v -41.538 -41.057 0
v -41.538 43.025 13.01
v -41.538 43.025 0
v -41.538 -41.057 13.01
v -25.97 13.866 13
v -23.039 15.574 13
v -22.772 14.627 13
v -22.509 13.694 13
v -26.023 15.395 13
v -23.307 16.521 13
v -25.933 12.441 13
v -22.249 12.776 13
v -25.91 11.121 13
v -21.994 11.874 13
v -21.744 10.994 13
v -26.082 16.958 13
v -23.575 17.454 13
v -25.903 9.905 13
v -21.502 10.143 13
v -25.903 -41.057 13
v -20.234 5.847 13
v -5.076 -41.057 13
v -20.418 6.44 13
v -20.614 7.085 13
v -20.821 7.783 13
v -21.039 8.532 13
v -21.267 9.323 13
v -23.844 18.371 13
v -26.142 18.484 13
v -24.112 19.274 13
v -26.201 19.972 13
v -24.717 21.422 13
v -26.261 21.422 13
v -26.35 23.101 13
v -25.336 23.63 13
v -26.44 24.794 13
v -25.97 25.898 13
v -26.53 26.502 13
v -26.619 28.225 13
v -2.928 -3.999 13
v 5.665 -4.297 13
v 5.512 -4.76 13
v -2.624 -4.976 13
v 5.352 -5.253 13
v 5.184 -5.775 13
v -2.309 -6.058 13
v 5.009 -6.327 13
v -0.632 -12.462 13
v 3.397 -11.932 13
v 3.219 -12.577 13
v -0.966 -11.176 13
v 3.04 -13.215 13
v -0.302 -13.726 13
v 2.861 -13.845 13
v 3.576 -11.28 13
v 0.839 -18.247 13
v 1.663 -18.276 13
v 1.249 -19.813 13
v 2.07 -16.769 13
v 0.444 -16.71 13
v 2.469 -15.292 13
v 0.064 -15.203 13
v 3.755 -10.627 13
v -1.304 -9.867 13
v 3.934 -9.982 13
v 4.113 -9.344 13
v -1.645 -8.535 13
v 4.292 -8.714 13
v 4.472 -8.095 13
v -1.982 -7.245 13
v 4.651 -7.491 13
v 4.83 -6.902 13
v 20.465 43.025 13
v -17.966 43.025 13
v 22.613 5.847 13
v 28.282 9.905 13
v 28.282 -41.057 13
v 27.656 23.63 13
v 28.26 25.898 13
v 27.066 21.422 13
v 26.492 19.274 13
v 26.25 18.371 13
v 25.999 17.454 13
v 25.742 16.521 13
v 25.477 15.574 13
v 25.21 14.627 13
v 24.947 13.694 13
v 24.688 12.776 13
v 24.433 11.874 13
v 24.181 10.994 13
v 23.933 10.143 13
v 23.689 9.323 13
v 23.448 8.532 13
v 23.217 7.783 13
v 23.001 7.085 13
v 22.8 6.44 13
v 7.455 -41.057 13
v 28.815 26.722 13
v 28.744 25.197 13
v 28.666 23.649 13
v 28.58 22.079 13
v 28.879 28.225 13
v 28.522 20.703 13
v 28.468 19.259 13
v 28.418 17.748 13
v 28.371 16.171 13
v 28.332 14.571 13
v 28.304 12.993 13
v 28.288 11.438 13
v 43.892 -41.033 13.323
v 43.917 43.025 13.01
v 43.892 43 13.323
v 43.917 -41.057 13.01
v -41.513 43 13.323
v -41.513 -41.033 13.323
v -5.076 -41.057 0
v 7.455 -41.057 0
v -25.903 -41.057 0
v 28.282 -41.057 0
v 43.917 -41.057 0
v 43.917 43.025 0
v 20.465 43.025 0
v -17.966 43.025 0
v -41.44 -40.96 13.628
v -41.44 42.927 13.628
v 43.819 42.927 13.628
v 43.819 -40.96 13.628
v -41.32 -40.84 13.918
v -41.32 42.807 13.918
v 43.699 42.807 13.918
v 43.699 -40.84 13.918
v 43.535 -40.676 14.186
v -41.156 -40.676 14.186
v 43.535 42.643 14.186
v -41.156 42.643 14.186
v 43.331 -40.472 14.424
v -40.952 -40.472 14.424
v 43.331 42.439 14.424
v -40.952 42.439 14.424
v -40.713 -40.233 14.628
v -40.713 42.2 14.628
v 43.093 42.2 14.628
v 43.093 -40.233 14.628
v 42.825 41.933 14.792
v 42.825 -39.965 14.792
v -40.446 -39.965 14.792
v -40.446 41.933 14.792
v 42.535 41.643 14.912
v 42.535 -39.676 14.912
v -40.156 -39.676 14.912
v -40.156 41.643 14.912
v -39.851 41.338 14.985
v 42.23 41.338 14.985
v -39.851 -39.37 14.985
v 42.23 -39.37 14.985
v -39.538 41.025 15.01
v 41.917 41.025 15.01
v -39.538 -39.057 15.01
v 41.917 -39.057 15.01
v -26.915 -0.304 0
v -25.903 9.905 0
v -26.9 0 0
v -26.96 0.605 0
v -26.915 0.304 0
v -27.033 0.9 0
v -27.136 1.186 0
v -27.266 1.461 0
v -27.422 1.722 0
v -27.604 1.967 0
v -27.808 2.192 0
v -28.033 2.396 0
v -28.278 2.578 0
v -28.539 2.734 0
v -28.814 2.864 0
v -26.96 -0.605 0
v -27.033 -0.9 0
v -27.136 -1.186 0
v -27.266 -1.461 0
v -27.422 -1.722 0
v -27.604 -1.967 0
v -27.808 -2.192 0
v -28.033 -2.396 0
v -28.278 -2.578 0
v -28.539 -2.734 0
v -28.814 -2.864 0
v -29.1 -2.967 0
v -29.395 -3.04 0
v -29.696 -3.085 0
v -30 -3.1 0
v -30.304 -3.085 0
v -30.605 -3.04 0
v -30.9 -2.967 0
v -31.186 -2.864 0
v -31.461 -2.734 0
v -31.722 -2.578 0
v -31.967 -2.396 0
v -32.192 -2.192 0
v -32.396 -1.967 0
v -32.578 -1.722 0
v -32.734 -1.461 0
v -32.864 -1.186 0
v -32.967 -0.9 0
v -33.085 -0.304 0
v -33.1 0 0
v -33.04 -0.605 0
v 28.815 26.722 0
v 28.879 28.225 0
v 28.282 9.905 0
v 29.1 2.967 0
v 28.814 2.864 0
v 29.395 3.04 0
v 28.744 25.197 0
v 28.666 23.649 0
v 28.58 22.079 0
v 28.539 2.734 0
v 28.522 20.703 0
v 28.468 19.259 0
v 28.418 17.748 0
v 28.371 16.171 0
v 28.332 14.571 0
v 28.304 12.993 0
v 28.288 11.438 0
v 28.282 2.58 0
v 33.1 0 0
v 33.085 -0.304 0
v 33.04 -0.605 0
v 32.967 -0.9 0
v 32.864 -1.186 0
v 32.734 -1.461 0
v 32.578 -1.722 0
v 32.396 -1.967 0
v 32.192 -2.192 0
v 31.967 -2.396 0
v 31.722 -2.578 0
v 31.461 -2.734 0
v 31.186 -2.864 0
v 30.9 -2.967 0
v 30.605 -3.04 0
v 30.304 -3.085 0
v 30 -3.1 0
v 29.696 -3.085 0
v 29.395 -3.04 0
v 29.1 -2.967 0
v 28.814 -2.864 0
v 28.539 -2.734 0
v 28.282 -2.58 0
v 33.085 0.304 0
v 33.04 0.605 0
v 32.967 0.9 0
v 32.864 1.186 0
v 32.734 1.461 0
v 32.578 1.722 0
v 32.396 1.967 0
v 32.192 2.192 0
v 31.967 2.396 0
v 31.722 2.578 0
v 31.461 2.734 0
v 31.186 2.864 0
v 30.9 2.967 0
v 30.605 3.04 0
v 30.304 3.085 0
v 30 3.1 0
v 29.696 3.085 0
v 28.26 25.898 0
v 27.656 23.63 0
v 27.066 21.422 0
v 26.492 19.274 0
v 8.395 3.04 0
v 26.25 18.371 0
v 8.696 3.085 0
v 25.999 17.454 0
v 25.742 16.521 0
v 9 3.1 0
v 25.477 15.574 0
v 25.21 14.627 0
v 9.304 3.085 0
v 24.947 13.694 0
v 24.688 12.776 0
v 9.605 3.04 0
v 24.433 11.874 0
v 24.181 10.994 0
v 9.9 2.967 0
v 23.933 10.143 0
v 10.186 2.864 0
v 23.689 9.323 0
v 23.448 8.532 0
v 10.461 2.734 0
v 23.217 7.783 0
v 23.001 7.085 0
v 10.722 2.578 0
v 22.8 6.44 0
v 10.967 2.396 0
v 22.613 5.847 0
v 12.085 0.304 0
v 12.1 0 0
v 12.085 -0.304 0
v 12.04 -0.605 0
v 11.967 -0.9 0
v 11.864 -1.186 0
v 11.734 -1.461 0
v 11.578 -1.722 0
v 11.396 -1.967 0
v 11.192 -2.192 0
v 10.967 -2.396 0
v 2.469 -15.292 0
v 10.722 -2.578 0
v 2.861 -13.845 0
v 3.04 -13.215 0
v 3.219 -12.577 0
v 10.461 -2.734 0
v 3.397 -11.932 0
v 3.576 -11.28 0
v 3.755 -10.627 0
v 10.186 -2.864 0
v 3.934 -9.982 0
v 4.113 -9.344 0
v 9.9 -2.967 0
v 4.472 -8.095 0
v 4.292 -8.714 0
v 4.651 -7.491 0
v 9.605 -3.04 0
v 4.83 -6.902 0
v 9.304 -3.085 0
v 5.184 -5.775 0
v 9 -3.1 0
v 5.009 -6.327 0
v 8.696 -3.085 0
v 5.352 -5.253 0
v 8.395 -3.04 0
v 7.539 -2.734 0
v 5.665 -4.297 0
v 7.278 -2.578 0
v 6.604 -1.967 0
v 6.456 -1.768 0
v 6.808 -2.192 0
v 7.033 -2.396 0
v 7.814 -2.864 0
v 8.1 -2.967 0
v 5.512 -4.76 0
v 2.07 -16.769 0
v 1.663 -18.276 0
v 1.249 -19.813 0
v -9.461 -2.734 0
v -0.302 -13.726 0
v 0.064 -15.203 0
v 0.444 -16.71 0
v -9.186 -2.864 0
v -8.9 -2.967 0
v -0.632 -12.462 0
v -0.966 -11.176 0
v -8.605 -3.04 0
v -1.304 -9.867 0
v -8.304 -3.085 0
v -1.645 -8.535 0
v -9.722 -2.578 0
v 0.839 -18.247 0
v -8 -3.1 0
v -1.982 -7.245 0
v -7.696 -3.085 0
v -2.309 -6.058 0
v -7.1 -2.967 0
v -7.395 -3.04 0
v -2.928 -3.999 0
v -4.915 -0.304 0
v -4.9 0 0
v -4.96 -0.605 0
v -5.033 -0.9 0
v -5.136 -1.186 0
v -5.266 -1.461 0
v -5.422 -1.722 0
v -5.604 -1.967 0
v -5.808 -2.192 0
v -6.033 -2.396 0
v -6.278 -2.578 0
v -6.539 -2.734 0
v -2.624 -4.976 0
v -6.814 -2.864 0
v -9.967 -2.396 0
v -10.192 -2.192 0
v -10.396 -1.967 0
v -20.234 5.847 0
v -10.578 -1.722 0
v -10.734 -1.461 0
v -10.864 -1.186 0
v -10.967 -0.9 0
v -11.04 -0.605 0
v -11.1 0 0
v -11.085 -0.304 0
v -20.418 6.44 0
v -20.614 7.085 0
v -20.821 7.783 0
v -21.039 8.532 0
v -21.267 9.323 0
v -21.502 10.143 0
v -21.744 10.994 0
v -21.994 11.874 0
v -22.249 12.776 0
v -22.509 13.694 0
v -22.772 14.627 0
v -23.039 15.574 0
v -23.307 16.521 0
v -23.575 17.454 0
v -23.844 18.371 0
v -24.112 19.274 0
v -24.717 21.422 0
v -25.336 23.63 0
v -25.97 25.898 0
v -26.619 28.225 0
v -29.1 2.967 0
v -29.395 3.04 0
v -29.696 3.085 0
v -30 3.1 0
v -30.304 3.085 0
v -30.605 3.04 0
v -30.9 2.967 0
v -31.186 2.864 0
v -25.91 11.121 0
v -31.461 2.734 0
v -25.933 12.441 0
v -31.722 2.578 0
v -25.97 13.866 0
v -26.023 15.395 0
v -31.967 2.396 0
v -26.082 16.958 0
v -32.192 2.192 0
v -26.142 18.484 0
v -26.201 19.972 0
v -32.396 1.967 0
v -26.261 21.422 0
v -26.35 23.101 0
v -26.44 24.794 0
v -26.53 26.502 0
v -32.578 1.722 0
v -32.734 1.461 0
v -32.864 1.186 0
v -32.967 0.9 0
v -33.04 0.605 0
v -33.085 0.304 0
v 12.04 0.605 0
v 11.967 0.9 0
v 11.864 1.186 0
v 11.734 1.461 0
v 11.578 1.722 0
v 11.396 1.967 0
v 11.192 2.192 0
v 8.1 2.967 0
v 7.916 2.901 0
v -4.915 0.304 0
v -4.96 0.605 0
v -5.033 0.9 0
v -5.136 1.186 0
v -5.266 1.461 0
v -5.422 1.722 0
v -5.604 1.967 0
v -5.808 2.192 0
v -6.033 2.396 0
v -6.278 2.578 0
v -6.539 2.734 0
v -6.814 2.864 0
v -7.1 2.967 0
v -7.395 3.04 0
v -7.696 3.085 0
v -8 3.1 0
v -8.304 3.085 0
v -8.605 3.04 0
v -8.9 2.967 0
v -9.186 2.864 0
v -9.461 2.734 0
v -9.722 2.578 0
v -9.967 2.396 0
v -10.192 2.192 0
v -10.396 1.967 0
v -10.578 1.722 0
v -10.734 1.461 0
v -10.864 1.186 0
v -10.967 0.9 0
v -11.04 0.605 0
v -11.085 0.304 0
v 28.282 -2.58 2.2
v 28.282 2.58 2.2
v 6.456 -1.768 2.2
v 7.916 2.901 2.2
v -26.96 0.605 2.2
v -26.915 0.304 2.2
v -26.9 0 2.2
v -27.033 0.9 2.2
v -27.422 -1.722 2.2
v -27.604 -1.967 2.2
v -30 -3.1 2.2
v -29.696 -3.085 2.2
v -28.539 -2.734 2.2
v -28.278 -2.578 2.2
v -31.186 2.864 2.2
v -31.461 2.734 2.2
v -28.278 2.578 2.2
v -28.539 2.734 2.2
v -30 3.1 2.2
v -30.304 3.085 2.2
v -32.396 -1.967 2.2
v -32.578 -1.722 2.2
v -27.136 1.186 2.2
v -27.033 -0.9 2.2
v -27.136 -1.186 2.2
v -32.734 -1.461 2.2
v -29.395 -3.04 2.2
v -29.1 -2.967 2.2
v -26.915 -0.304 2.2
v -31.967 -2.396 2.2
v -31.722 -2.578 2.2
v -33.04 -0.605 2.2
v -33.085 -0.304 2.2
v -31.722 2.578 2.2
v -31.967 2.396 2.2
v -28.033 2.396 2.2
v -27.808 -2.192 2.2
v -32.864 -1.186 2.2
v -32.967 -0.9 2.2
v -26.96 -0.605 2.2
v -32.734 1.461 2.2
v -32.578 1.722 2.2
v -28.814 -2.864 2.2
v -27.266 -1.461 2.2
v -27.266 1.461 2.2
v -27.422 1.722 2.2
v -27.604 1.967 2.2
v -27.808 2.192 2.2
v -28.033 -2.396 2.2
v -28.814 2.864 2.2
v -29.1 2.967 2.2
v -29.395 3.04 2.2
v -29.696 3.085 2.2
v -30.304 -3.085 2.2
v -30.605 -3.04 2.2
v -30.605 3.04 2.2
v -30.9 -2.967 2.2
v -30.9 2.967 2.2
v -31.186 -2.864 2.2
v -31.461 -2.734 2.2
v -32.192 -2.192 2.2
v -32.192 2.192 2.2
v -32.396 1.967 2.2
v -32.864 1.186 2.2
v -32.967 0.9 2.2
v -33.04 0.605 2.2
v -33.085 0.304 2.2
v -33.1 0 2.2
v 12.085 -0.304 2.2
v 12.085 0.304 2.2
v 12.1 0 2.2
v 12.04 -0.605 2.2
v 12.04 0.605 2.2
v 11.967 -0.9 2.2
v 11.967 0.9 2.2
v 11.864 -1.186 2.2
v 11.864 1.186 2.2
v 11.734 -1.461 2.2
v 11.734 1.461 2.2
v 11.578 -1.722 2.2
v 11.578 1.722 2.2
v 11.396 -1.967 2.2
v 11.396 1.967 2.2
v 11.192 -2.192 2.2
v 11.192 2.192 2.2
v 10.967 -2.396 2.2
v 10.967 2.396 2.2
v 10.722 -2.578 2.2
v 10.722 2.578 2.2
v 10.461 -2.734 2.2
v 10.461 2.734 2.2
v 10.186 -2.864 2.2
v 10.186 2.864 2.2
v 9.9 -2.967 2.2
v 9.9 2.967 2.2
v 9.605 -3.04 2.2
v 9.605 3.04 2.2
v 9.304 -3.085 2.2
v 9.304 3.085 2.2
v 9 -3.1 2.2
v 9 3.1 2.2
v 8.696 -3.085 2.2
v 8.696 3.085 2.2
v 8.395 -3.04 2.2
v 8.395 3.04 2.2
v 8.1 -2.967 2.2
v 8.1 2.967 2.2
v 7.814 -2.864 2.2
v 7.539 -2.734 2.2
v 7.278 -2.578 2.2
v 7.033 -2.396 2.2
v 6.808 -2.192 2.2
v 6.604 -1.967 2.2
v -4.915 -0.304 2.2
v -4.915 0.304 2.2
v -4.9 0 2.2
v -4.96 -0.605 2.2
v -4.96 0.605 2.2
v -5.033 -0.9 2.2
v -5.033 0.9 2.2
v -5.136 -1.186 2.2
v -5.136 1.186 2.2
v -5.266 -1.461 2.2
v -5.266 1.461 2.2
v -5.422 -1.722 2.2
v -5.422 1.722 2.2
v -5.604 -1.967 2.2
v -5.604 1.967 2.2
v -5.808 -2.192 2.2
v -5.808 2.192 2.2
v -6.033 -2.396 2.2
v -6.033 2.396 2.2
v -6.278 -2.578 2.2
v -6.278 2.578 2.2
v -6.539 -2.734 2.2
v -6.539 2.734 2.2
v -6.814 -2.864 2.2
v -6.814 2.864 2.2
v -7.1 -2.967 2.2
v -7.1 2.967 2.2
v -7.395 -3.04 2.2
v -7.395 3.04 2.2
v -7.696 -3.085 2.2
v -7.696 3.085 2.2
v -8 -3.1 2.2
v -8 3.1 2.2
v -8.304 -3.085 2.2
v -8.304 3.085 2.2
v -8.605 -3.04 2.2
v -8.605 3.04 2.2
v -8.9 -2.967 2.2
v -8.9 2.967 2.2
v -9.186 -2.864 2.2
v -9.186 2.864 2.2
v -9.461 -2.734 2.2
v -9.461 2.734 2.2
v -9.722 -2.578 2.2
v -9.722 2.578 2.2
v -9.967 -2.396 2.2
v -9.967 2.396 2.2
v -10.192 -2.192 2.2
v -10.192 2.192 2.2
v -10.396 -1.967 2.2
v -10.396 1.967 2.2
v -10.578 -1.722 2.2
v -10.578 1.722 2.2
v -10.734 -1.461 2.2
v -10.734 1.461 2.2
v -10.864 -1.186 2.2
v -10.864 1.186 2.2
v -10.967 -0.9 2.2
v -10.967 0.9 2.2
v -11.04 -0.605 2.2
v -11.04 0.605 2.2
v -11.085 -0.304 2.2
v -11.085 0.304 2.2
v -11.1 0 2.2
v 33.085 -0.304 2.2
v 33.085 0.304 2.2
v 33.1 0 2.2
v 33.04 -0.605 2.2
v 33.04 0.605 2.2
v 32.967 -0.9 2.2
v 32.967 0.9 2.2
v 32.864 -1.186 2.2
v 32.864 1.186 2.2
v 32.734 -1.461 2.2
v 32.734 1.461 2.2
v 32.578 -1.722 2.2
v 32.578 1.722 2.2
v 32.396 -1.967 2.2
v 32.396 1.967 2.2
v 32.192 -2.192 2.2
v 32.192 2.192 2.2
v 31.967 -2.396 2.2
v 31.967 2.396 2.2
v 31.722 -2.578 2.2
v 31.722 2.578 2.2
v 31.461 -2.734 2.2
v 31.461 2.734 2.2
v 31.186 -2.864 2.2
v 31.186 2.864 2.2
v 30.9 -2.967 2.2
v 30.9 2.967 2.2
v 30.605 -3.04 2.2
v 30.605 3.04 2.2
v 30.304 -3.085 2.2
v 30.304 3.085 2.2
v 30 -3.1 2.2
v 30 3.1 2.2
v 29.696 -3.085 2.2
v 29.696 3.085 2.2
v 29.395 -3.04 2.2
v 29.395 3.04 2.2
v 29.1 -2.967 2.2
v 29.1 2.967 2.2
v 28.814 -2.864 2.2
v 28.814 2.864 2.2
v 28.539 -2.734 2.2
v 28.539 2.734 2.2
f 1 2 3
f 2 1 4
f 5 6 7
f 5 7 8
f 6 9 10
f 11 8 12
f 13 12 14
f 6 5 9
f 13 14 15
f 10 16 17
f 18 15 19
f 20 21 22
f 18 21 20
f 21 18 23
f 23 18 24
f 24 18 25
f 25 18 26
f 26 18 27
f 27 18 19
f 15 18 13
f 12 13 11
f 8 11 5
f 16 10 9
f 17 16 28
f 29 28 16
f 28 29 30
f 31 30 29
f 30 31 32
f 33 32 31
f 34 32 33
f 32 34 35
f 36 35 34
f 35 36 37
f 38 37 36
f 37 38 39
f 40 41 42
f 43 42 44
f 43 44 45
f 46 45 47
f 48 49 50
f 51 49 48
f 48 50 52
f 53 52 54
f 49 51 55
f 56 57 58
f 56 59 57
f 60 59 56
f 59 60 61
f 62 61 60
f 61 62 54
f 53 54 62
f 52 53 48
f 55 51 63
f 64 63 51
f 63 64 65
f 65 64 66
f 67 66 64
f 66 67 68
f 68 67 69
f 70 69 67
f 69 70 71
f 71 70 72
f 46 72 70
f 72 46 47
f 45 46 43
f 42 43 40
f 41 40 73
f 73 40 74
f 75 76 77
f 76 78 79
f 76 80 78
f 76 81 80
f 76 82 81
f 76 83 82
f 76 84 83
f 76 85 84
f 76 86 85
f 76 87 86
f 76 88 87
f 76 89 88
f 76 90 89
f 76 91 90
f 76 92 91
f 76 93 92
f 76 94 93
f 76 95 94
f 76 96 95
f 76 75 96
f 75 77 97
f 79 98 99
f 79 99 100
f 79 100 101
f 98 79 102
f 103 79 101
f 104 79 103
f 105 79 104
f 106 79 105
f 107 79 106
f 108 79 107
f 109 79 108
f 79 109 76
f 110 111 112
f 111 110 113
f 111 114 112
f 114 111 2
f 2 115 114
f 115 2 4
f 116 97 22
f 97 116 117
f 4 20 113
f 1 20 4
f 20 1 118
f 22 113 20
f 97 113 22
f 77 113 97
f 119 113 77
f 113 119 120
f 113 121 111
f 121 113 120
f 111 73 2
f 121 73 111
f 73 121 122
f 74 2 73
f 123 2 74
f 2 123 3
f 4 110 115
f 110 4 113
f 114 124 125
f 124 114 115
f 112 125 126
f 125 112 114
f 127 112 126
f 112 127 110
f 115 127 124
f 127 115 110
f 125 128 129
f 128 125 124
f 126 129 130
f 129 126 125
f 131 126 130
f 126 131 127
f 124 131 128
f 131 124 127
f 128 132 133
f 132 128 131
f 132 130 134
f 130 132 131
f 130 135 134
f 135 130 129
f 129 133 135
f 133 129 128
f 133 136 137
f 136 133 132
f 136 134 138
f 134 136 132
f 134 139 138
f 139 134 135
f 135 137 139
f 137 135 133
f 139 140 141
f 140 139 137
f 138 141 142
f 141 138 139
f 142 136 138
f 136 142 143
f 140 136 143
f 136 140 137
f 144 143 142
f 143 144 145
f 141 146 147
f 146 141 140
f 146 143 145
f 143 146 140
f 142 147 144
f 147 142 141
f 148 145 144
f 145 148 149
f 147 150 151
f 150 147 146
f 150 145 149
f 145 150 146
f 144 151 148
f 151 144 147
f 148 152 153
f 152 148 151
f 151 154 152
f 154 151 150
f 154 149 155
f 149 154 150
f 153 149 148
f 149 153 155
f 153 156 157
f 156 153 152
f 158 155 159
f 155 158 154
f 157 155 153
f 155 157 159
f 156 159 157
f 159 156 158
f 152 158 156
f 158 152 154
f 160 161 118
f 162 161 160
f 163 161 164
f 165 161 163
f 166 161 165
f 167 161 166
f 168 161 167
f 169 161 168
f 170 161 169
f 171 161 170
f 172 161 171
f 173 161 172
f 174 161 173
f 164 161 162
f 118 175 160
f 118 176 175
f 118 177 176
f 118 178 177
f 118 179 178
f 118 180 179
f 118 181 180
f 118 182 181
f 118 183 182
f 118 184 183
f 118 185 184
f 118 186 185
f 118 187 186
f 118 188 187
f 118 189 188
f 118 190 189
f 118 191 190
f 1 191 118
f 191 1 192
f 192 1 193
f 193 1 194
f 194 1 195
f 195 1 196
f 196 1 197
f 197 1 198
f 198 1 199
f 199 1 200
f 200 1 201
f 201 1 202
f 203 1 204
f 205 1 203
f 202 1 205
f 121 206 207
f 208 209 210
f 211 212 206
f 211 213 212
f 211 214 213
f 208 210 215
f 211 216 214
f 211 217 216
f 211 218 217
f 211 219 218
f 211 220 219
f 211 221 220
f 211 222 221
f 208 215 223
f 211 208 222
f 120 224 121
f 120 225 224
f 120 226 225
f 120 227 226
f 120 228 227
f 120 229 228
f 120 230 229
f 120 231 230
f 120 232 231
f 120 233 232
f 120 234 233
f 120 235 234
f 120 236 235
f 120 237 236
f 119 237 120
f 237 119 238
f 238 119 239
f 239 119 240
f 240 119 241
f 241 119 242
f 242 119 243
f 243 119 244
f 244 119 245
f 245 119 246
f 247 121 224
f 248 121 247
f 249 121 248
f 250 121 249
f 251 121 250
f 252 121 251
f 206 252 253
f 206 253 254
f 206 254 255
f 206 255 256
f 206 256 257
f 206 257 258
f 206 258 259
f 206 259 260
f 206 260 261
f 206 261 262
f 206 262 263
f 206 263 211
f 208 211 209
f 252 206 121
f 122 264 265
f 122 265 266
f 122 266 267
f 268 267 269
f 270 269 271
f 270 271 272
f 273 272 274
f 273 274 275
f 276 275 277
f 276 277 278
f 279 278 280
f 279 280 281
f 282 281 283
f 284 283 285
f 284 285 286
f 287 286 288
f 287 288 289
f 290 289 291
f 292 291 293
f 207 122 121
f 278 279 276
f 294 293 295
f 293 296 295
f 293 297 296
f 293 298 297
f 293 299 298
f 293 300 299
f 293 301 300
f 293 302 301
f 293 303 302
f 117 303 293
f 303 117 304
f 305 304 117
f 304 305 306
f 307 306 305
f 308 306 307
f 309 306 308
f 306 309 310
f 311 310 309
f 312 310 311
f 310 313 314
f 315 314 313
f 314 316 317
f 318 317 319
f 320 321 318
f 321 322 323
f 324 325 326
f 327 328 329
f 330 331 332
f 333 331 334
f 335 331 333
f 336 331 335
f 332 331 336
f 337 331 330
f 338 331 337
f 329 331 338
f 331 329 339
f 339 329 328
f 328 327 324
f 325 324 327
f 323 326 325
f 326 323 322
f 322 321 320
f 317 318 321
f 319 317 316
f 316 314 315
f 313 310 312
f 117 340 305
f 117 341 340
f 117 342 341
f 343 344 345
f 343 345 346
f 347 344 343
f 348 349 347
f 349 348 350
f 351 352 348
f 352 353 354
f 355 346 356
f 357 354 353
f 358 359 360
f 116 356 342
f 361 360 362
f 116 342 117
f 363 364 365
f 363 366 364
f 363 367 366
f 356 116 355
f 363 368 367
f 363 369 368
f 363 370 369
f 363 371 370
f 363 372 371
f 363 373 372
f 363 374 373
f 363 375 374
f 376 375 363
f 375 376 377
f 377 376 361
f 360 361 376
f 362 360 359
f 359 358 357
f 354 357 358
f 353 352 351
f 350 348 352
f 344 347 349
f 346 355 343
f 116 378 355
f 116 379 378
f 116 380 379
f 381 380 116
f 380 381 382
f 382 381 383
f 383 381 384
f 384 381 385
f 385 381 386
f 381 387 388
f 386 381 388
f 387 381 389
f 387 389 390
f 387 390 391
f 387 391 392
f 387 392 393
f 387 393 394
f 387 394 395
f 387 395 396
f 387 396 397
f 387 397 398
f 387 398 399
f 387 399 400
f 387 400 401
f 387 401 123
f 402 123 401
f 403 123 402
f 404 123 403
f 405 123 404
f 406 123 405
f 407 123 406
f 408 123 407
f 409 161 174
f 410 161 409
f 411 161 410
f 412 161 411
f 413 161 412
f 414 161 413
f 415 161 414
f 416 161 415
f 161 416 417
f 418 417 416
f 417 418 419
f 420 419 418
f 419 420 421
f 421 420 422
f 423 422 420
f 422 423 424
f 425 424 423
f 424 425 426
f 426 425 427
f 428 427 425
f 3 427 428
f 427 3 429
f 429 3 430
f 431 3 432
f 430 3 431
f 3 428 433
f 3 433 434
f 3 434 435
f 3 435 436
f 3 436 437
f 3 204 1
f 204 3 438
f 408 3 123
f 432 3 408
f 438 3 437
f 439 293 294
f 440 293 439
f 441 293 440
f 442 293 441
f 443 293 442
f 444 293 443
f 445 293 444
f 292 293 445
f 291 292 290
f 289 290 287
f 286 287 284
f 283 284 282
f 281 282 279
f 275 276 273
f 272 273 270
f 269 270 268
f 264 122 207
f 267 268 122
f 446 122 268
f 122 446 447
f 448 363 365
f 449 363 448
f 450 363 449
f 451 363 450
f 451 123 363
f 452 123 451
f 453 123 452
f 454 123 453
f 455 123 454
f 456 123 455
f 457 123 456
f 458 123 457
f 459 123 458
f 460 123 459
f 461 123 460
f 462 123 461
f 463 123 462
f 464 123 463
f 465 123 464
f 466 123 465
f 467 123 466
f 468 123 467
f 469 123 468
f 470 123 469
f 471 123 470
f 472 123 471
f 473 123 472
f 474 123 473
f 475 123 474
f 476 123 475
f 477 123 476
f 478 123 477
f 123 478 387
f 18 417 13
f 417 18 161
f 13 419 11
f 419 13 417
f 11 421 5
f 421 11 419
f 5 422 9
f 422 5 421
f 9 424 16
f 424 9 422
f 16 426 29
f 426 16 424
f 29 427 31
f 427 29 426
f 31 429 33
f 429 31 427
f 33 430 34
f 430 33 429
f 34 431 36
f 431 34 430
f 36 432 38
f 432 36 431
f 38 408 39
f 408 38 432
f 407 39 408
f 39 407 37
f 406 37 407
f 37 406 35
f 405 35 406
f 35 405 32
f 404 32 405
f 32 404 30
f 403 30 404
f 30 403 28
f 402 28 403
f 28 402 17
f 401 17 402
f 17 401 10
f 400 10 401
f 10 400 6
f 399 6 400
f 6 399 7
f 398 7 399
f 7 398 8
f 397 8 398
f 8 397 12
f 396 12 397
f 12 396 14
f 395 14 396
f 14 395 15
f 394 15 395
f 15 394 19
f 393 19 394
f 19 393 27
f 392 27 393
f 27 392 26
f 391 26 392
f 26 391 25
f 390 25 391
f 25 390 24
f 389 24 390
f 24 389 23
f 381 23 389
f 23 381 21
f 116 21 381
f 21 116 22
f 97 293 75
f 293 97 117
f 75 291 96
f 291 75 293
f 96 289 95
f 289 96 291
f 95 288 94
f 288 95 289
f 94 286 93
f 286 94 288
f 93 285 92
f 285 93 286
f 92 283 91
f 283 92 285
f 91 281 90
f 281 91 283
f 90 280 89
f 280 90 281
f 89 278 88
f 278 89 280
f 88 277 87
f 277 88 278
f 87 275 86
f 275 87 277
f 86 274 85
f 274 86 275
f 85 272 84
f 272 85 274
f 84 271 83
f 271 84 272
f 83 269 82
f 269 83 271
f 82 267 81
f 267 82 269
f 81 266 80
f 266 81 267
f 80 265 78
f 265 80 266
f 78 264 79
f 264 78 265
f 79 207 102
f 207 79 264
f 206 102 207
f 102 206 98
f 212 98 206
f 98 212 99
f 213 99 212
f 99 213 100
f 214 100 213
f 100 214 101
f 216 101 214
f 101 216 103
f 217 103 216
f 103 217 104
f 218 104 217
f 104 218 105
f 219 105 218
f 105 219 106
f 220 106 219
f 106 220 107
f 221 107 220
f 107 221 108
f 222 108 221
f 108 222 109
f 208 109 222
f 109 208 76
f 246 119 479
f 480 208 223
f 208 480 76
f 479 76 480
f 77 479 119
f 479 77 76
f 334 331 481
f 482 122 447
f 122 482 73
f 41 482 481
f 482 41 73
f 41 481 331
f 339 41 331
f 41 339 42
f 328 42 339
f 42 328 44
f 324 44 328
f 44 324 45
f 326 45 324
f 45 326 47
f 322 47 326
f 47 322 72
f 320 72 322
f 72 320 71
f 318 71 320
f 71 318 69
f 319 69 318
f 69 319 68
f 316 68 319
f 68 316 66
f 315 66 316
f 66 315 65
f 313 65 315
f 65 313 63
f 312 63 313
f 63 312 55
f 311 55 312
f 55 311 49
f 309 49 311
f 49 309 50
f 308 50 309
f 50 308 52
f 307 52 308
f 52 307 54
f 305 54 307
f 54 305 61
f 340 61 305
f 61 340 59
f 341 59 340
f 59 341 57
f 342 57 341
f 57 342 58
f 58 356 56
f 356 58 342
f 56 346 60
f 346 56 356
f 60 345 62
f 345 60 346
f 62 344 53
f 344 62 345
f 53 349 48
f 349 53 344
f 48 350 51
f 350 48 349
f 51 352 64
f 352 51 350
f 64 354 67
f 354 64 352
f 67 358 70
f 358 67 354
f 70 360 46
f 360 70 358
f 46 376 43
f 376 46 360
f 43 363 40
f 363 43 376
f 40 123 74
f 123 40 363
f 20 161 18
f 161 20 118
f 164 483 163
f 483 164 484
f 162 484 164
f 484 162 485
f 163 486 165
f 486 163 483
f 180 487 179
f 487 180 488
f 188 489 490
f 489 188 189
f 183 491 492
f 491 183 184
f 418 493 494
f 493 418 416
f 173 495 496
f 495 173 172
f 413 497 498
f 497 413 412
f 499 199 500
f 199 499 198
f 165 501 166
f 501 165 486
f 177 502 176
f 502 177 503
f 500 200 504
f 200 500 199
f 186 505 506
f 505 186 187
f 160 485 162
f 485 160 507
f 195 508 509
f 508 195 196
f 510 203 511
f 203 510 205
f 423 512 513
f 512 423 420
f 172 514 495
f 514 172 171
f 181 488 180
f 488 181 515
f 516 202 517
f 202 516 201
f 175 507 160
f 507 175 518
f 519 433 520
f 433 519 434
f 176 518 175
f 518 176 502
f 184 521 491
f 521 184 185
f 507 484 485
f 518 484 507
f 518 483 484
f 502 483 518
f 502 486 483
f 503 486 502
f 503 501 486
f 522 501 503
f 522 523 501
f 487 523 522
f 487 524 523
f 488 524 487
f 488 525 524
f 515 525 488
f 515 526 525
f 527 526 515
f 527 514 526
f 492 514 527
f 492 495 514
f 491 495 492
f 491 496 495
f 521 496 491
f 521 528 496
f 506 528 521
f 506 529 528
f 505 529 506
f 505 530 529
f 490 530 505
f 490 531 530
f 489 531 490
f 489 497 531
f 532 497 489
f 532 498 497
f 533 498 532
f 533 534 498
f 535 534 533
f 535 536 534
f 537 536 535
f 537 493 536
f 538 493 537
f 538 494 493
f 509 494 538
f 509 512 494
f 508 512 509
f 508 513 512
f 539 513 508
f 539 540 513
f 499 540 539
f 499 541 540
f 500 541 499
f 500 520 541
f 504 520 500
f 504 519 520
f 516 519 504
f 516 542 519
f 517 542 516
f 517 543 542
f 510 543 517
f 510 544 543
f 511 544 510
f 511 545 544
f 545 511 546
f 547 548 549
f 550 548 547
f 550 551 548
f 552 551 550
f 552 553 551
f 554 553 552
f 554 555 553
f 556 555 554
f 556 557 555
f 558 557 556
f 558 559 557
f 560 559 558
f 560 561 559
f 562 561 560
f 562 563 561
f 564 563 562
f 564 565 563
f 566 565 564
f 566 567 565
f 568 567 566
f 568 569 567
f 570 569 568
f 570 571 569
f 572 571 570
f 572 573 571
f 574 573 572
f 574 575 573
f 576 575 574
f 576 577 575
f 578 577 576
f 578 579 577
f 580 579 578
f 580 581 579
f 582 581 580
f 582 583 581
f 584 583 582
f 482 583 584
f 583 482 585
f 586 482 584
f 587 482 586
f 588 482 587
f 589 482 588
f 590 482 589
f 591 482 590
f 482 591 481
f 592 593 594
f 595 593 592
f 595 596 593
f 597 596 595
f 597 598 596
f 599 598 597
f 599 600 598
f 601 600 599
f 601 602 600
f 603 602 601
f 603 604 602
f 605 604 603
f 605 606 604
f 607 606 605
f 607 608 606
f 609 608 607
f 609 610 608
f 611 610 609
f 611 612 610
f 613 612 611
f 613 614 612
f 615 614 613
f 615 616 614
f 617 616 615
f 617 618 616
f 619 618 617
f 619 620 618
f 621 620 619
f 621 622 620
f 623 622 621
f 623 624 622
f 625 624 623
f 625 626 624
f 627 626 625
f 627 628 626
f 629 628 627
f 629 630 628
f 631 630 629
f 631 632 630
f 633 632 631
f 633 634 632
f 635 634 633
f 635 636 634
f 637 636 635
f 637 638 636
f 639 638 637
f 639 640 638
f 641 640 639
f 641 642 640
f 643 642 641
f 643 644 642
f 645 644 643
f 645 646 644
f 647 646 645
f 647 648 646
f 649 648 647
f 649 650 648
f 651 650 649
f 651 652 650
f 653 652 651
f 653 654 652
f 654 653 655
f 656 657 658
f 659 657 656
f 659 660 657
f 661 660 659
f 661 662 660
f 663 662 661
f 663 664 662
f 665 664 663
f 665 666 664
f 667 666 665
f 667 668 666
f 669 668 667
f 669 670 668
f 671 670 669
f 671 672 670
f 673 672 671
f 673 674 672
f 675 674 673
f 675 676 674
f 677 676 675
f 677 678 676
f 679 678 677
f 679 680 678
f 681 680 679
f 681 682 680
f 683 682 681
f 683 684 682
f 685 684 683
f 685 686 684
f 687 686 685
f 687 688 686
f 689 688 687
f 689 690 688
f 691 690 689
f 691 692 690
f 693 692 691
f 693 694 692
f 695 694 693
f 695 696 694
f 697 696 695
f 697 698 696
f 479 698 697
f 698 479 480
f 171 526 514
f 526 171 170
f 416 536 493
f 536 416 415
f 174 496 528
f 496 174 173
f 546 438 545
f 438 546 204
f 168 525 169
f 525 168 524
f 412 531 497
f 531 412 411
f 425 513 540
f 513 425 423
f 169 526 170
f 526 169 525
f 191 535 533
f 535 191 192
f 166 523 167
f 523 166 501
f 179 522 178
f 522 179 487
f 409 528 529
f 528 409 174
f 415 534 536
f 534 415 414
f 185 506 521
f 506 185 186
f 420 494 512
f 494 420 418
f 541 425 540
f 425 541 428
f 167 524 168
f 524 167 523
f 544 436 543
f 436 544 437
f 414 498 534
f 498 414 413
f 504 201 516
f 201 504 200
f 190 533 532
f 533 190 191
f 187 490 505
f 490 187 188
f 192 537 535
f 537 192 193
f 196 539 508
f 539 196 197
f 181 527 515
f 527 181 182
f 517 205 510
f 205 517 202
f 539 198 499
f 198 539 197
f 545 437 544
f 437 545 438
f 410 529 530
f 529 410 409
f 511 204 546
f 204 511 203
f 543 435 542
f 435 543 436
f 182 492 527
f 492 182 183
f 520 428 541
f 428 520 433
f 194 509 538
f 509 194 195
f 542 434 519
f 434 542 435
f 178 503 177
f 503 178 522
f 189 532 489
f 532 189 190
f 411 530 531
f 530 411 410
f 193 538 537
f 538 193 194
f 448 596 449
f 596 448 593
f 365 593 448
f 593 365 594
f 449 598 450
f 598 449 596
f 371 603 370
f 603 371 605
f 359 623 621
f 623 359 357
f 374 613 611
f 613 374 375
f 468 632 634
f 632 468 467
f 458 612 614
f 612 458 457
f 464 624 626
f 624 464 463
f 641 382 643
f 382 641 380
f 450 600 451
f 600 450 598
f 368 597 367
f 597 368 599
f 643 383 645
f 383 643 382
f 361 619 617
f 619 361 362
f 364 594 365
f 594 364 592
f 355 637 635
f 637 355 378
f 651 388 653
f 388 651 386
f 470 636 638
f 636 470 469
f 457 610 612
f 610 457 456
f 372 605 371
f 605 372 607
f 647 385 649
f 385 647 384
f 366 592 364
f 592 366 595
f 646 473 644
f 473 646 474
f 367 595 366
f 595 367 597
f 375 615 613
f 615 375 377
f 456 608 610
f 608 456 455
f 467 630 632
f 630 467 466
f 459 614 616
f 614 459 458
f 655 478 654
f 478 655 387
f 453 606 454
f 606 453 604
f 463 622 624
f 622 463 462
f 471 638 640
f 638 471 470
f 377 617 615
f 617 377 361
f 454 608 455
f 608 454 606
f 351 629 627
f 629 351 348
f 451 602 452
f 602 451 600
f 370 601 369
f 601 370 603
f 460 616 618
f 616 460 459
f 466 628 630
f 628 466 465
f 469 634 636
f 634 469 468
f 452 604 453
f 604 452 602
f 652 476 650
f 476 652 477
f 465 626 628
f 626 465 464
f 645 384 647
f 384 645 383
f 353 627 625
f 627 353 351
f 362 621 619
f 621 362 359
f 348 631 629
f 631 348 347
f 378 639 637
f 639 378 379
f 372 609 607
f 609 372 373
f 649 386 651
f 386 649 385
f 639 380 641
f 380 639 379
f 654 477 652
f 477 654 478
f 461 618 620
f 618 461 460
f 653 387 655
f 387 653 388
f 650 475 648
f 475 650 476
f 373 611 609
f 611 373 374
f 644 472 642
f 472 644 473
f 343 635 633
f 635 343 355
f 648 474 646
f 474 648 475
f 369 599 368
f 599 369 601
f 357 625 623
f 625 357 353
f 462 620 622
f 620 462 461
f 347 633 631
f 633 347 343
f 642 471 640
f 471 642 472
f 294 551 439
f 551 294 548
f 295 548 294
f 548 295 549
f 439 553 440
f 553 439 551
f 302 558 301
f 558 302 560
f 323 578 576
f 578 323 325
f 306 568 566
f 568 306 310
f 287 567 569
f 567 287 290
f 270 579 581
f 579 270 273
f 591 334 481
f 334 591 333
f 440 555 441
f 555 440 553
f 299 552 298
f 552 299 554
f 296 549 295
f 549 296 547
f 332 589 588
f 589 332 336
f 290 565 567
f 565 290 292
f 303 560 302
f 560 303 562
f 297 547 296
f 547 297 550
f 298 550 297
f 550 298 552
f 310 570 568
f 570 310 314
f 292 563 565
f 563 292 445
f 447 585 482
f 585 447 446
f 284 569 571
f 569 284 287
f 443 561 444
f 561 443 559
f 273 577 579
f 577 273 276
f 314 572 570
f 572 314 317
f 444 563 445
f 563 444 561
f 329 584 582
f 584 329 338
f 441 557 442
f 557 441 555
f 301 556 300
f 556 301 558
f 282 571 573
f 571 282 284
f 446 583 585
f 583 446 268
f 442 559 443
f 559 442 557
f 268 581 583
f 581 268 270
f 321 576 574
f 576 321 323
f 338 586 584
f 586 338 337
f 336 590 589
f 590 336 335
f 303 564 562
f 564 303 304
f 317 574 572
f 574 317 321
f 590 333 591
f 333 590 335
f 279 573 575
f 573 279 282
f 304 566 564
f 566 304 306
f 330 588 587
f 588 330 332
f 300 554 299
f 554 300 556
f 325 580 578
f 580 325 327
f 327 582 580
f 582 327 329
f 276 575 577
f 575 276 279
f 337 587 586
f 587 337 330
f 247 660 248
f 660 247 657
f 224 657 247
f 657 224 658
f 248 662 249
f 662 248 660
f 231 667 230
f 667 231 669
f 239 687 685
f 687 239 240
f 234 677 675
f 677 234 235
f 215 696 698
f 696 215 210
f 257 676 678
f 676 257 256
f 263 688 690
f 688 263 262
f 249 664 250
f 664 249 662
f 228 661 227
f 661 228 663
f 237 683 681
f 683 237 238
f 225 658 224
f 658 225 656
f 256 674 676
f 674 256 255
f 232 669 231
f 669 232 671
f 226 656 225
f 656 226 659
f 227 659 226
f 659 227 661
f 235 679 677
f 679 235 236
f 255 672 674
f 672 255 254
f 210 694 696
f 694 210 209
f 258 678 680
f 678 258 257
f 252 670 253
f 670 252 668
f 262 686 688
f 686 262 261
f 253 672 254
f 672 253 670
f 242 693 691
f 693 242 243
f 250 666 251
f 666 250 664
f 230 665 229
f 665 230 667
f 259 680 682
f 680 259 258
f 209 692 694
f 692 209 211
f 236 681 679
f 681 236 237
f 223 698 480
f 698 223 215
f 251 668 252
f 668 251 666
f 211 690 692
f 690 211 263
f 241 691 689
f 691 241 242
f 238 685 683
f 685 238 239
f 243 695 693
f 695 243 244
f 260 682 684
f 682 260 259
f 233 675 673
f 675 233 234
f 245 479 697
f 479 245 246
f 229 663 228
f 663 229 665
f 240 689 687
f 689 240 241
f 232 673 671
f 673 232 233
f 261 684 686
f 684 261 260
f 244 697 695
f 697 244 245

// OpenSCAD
// Fridge magnet letter tile — fits 100×100 mm build plate
// Render one letter:
//   openscad -q -D 'letter="M"' -o M.stl magnetic_letter_only.scad
// Batch-render a word:
//   for L in M O E; do openscad -q -D "letter=\"$L\"" -o "$L.stl" magnetic_letter_only.scad; done
//
// Slicer tips for faster prints:
//   - 0.28 mm layer height (or 0.3 if your nozzle allows)
//   - 10–15 % infill (gyroid or grid) — or enable hollow below
//   - 3 perimeters is plenty for strength

// ╔══════════════════════════════════════════════════════════════════╗
// ║  SETTINGS — edit these, leave everything below alone            ║
// ╚══════════════════════════════════════════════════════════════════╝

letter    = "M";
size      = 88;   // glyph height in mm (88 ≈ full 100×100 plate)
thickness = 15;   // Z height of the tile

// ── MODE — uncomment exactly one ─────────────────────────────────────────────
mode = "smart";    // hardcoded per-letter positions for A–Z (best quality)
// mode = "spiral";  // auto-spiral; only pockets that FULLY fit inside are kept
// mode = "manual";  // use magnet_positions list below

// ── Font ─────────────────────────────────────────────────────────────────────
// font_name = "Comic Sans MS:style=Bold";   // ← the MOE font (not in WASM)
// font_name = "Bahnschrift:style=Bold";
// font_name = "Bahnschrift:style=Bold Condensed";
font_name = "Liberation Sans:style=Bold";  // ← works in both WASM and desktop
// font_name = "Arial:style=Bold";
// font_name = "Impact";
// font_name = "Anton";                    // Google Font — narrow + punchy
// font_name = "Oswald:style=Bold";        // Google Font — tall + slim

// ── Fillet ───────────────────────────────────────────────────────────────────
// Rounded top edge — makes the face side feel nice.  Bottom stays flat for
// bed adhesion and magnet pockets.  Set to 0 to disable.
fillet_r     = 2;    // radius of the quarter-round (mm)
fillet_steps = 10;   // curve smoothness (more = smoother but slower render)

// ── Magnet spec ──────────────────────────────────────────────────────────────
magnet_d     = 6.2;  // pocket diameter (slightly loose for 6 mm disc magnets)
magnet_depth = 2.2;  // pocket depth

// ── MANUAL positions (used when mode = "manual") ─────────────────────────────
// Origin [0,0] = visual centre of the glyph.
magnet_positions = [
  [ 17,  15],
  [ 11, -15],
  [-15,  15],
];

// ── SPIRAL settings (used when mode = "spiral") ──────────────────────────────
spiral_max     = 4;   // target pocket count (magnets are expensive!)
spiral_spacing = 16;  // mm between candidate ring steps

// ╔══════════════════════════════════════════════════════════════════╗
// ║  PER-LETTER MAGNET POSITIONS  (mode = "smart")                  ║
// ║  Tuned for Comic Sans MS Bold at size = 88.                     ║
// ║  Coords are mm from the visual centre of each glyph.            ║
// ║  Safety-masked against the letter body so any position that      ║
// ║  misses the stroke is silently dropped.                          ║
// ╚══════════════════════════════════════════════════════════════════╝
function letter_magnets(ch) =
  ch == "A" ? [[-20, -20], [ 20, -20], [  0,  -5]             ] :
  ch == "B" ? [[-24,  18], [-24, -15], [ 14,  18], [ 14,  -8] ] :
  ch == "C" ? [[-30,   0], [  0,  26], [  0, -26]             ] :
  ch == "D" ? [[-24,  18], [-24, -18], [ 20,   0]             ] :
  ch == "E" ? [[-24,  20], [-24, -20], [ 10,  24], [ 10, -24] ] :
  ch == "F" ? [[-24,  20], [-24,  -8], [ 10,  26]             ] :
  ch == "G" ? [[-30,   0], [  0,  26], [ 20,  -8]             ] :
  ch == "H" ? [[-24,  15], [-24, -15], [ 24,  15], [ 24, -15] ] :
  ch == "I" ? [[  0,  18], [  0, -18]                         ] :
  ch == "J" ? [[ 16,  22], [  0, -24]                         ] :
  ch == "K" ? [[-24,  15], [-24, -15], [ 14,  22], [ 14, -22] ] :
  ch == "L" ? [[-24,  18], [-24,  -8], [ 12, -28]             ] :
  ch == "M" ? [[-30,   0], [ -8,   0], [  9,   0], [ 30,   0] ] :
  ch == "N" ? [[-24,  15], [-24, -15], [ 24,  15], [ 24, -15] ] :
  ch == "O" ? [[-28,   0], [ 28,   0], [  0,  24], [  0, -24] ] :
  ch == "P" ? [[-24,  15], [-24, -20], [ 16,  18]             ] :
  ch == "Q" ? [[-28,   0], [  0,  24], [ 24, -15]             ] :
  ch == "R" ? [[-24,  15], [-24, -20], [ 16,  18], [ 16, -20] ] :
  ch == "S" ? [[-12,  20], [ 12, -20]                         ] :
  ch == "T" ? [[-26,  28], [ 26,  28], [  0, -10]             ] :
  ch == "U" ? [[-24,  15], [ 24,  15], [  0, -26]             ] :
  ch == "V" ? [[-22,  22], [ 22,  22]                         ] :
  ch == "W" ? [[-30,   5], [-10, -18], [ 10, -18], [ 30,   5] ] :
  ch == "X" ? [[-18,  22], [ 18,  22], [-18, -22], [ 18, -22] ] :
  ch == "Y" ? [[-22,  22], [ 22,  22], [  0, -16]             ] :
  ch == "Z" ? [[ 10,  28], [  0,   0], [-10, -28]             ] :
  /* fallback */ [[0, 0]];

// ╔══════════════════════════════════════════════════════════════════╗
// ║  INTERNALS — nothing to edit below here                         ║
// ╚══════════════════════════════════════════════════════════════════╝

// Adaptive quality: fast in preview (F5), full detail in render (F6)
_fn = $preview ? 24 : 64;

// Spiral candidate generator — rings expand outward from [0,0].
function _ring(r, sp) =
  r == 0 ? [[0, 0]]
         : [for (a = [0 : 360 / (r * 6) : 359.9])
              [sp * r * cos(a), sp * r * sin(a)]];

function _spiral_pts(sp, rings) =
  [for (r = [0:rings], pt = _ring(r, sp)) pt];

_candidates = _spiral_pts(spiral_spacing, 4);  // ~60 candidates, inner-first

// ── Shared helpers ───────────────────────────────────────────────────────────

// 2D letter glyph — single source of truth for the shape
module _letter_2d() {
  text(letter, size = size, font = font_name,
       halign = "center", valign = "center");
}

// 2D letter eroded inward by magnet radius + margin.
module _eroded_2d() {
  offset(r = -(magnet_d / 2 + 0.3))
    _letter_2d();
}

// ── Letter body with optional fillet ─────────────────────────────────────────

module letter_body() {
  if (fillet_r > 0) {
    // Flat-sided main body up to the fillet zone
    linear_extrude(height = thickness - fillet_r)
      _letter_2d();

    // Quarter-circle rolloff at the top edge.
    // Each step hulls two thin slices at slightly different offsets/heights,
    // tracing a smooth arc that rounds the edge.
    for (i = [0 : fillet_steps - 1]) {
      t0 = i       / fillet_steps;
      t1 = (i + 1) / fillet_steps;
      // Quarter-circle parameterisation
      inset0 = fillet_r * (1 - cos(t0 * 90));
      inset1 = fillet_r * (1 - cos(t1 * 90));
      z0 = thickness - fillet_r + fillet_r * sin(t0 * 90);
      z1 = thickness - fillet_r + fillet_r * sin(t1 * 90);
      hull() {
        translate([0, 0, z0])
          linear_extrude(height = 0.01)
            offset(r = -inset0) _letter_2d();
        translate([0, 0, z1])
          linear_extrude(height = 0.01)
            offset(r = -inset1) _letter_2d();
      }
    }
  } else {
    // No fillet — simple extrude
    linear_extrude(height = thickness)
      _letter_2d();
  }
}

// ── Pocket modules ───────────────────────────────────────────────────────────

// SMART — hardcoded positions, masked against the letter body.
module smart_pockets() {
  intersection() {
    linear_extrude(height = magnet_depth)
      _letter_2d();
    union()
      for (p = letter_magnets(letter))
        translate([p[0], p[1], 0])
          cylinder(h = magnet_depth, d = magnet_d, $fn = _fn);
  }
}

// SPIRAL — morphological erosion guarantees every surviving pocket fully fits.
module spiral_pockets() {
  test_count = min(spiral_max * 5, len(_candidates));
  for (i = [0 : test_count - 1]) {
    cx = _candidates[i][0];
    cy = _candidates[i][1];
    minkowski() {
      intersection() {
        linear_extrude(height = 0.02)
          _eroded_2d();
        translate([cx, cy, 0])
          cylinder(h = 0.02, r = 0.01, $fn = 4);
      }
      cylinder(h = magnet_depth, d = magnet_d, $fn = _fn);
    }
  }
}

// MANUAL — raw positions, no masking.
module manual_pockets() {
  for (p = magnet_positions)
    translate([p[0], p[1], 0])
      cylinder(h = magnet_depth, d = magnet_d, $fn = _fn);
}

// ── Main ─────────────────────────────────────────────────────────────────────

echo(str("letter=\"", letter, "\"  mode=", mode,
         "  font=", font_name,
         "  fillet=", fillet_r, "mm"));

difference() {
  letter_body();
  if      (mode == "smart")  smart_pockets();
  else if (mode == "spiral") spiral_pockets();
  else                       manual_pockets();
}
